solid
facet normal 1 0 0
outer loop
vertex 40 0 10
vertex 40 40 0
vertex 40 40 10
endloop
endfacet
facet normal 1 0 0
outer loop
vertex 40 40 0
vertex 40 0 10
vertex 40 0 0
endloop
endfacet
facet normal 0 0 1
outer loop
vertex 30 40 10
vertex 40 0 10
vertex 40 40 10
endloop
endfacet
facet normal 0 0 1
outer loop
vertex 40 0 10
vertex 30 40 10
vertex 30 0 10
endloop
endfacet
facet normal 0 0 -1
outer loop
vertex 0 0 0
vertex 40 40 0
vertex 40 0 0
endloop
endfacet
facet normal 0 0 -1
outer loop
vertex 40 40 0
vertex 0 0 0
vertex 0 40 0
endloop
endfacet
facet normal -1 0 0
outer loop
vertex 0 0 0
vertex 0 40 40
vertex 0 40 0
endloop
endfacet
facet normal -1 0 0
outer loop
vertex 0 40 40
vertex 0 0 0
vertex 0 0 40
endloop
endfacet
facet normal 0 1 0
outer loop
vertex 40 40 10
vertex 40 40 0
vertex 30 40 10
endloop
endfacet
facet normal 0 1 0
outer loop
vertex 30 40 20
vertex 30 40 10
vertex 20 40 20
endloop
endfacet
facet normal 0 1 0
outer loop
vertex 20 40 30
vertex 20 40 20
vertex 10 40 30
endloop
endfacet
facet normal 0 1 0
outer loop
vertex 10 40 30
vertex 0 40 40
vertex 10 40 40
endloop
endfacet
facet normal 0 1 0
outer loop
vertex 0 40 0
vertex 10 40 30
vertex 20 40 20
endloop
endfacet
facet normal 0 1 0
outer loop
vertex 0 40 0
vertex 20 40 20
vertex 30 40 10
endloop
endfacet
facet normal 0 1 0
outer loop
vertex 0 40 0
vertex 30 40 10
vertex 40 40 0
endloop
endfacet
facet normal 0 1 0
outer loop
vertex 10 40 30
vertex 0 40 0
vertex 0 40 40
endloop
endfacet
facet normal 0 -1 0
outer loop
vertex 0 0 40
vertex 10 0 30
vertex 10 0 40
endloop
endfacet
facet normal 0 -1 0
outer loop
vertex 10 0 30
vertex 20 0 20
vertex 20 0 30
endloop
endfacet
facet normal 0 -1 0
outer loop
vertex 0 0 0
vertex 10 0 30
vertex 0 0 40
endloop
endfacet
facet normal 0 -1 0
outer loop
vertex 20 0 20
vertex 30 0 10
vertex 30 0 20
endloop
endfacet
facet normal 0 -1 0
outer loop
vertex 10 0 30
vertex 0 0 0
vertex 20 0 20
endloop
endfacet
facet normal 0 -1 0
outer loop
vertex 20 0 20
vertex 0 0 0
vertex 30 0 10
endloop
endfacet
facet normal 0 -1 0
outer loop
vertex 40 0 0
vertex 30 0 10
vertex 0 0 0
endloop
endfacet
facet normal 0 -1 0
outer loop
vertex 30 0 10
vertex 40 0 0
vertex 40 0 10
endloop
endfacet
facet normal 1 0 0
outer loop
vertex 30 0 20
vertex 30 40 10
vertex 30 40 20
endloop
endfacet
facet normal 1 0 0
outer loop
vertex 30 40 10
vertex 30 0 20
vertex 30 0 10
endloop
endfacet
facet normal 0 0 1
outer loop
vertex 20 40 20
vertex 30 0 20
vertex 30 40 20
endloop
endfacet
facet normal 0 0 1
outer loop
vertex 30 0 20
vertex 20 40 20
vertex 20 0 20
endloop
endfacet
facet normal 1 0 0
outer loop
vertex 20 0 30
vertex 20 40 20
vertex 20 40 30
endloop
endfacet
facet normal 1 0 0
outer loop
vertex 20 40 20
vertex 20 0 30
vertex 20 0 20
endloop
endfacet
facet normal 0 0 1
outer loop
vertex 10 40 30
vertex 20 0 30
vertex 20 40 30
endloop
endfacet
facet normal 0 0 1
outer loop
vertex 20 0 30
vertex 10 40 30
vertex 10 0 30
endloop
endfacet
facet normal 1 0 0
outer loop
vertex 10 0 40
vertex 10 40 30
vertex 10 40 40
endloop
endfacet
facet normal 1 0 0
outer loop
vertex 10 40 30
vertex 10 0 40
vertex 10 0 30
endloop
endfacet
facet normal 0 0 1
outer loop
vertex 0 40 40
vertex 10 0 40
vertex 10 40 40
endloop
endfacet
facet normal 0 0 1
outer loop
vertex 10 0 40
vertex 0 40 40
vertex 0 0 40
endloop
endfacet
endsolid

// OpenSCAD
union(){
cube([40,40,10]);
translate([0,0,10])
cube([30,40,10]);
translate([0,0,20])
cube([20,40,10]);
translate([0,0,30])
cube([10,40,10]);
}
